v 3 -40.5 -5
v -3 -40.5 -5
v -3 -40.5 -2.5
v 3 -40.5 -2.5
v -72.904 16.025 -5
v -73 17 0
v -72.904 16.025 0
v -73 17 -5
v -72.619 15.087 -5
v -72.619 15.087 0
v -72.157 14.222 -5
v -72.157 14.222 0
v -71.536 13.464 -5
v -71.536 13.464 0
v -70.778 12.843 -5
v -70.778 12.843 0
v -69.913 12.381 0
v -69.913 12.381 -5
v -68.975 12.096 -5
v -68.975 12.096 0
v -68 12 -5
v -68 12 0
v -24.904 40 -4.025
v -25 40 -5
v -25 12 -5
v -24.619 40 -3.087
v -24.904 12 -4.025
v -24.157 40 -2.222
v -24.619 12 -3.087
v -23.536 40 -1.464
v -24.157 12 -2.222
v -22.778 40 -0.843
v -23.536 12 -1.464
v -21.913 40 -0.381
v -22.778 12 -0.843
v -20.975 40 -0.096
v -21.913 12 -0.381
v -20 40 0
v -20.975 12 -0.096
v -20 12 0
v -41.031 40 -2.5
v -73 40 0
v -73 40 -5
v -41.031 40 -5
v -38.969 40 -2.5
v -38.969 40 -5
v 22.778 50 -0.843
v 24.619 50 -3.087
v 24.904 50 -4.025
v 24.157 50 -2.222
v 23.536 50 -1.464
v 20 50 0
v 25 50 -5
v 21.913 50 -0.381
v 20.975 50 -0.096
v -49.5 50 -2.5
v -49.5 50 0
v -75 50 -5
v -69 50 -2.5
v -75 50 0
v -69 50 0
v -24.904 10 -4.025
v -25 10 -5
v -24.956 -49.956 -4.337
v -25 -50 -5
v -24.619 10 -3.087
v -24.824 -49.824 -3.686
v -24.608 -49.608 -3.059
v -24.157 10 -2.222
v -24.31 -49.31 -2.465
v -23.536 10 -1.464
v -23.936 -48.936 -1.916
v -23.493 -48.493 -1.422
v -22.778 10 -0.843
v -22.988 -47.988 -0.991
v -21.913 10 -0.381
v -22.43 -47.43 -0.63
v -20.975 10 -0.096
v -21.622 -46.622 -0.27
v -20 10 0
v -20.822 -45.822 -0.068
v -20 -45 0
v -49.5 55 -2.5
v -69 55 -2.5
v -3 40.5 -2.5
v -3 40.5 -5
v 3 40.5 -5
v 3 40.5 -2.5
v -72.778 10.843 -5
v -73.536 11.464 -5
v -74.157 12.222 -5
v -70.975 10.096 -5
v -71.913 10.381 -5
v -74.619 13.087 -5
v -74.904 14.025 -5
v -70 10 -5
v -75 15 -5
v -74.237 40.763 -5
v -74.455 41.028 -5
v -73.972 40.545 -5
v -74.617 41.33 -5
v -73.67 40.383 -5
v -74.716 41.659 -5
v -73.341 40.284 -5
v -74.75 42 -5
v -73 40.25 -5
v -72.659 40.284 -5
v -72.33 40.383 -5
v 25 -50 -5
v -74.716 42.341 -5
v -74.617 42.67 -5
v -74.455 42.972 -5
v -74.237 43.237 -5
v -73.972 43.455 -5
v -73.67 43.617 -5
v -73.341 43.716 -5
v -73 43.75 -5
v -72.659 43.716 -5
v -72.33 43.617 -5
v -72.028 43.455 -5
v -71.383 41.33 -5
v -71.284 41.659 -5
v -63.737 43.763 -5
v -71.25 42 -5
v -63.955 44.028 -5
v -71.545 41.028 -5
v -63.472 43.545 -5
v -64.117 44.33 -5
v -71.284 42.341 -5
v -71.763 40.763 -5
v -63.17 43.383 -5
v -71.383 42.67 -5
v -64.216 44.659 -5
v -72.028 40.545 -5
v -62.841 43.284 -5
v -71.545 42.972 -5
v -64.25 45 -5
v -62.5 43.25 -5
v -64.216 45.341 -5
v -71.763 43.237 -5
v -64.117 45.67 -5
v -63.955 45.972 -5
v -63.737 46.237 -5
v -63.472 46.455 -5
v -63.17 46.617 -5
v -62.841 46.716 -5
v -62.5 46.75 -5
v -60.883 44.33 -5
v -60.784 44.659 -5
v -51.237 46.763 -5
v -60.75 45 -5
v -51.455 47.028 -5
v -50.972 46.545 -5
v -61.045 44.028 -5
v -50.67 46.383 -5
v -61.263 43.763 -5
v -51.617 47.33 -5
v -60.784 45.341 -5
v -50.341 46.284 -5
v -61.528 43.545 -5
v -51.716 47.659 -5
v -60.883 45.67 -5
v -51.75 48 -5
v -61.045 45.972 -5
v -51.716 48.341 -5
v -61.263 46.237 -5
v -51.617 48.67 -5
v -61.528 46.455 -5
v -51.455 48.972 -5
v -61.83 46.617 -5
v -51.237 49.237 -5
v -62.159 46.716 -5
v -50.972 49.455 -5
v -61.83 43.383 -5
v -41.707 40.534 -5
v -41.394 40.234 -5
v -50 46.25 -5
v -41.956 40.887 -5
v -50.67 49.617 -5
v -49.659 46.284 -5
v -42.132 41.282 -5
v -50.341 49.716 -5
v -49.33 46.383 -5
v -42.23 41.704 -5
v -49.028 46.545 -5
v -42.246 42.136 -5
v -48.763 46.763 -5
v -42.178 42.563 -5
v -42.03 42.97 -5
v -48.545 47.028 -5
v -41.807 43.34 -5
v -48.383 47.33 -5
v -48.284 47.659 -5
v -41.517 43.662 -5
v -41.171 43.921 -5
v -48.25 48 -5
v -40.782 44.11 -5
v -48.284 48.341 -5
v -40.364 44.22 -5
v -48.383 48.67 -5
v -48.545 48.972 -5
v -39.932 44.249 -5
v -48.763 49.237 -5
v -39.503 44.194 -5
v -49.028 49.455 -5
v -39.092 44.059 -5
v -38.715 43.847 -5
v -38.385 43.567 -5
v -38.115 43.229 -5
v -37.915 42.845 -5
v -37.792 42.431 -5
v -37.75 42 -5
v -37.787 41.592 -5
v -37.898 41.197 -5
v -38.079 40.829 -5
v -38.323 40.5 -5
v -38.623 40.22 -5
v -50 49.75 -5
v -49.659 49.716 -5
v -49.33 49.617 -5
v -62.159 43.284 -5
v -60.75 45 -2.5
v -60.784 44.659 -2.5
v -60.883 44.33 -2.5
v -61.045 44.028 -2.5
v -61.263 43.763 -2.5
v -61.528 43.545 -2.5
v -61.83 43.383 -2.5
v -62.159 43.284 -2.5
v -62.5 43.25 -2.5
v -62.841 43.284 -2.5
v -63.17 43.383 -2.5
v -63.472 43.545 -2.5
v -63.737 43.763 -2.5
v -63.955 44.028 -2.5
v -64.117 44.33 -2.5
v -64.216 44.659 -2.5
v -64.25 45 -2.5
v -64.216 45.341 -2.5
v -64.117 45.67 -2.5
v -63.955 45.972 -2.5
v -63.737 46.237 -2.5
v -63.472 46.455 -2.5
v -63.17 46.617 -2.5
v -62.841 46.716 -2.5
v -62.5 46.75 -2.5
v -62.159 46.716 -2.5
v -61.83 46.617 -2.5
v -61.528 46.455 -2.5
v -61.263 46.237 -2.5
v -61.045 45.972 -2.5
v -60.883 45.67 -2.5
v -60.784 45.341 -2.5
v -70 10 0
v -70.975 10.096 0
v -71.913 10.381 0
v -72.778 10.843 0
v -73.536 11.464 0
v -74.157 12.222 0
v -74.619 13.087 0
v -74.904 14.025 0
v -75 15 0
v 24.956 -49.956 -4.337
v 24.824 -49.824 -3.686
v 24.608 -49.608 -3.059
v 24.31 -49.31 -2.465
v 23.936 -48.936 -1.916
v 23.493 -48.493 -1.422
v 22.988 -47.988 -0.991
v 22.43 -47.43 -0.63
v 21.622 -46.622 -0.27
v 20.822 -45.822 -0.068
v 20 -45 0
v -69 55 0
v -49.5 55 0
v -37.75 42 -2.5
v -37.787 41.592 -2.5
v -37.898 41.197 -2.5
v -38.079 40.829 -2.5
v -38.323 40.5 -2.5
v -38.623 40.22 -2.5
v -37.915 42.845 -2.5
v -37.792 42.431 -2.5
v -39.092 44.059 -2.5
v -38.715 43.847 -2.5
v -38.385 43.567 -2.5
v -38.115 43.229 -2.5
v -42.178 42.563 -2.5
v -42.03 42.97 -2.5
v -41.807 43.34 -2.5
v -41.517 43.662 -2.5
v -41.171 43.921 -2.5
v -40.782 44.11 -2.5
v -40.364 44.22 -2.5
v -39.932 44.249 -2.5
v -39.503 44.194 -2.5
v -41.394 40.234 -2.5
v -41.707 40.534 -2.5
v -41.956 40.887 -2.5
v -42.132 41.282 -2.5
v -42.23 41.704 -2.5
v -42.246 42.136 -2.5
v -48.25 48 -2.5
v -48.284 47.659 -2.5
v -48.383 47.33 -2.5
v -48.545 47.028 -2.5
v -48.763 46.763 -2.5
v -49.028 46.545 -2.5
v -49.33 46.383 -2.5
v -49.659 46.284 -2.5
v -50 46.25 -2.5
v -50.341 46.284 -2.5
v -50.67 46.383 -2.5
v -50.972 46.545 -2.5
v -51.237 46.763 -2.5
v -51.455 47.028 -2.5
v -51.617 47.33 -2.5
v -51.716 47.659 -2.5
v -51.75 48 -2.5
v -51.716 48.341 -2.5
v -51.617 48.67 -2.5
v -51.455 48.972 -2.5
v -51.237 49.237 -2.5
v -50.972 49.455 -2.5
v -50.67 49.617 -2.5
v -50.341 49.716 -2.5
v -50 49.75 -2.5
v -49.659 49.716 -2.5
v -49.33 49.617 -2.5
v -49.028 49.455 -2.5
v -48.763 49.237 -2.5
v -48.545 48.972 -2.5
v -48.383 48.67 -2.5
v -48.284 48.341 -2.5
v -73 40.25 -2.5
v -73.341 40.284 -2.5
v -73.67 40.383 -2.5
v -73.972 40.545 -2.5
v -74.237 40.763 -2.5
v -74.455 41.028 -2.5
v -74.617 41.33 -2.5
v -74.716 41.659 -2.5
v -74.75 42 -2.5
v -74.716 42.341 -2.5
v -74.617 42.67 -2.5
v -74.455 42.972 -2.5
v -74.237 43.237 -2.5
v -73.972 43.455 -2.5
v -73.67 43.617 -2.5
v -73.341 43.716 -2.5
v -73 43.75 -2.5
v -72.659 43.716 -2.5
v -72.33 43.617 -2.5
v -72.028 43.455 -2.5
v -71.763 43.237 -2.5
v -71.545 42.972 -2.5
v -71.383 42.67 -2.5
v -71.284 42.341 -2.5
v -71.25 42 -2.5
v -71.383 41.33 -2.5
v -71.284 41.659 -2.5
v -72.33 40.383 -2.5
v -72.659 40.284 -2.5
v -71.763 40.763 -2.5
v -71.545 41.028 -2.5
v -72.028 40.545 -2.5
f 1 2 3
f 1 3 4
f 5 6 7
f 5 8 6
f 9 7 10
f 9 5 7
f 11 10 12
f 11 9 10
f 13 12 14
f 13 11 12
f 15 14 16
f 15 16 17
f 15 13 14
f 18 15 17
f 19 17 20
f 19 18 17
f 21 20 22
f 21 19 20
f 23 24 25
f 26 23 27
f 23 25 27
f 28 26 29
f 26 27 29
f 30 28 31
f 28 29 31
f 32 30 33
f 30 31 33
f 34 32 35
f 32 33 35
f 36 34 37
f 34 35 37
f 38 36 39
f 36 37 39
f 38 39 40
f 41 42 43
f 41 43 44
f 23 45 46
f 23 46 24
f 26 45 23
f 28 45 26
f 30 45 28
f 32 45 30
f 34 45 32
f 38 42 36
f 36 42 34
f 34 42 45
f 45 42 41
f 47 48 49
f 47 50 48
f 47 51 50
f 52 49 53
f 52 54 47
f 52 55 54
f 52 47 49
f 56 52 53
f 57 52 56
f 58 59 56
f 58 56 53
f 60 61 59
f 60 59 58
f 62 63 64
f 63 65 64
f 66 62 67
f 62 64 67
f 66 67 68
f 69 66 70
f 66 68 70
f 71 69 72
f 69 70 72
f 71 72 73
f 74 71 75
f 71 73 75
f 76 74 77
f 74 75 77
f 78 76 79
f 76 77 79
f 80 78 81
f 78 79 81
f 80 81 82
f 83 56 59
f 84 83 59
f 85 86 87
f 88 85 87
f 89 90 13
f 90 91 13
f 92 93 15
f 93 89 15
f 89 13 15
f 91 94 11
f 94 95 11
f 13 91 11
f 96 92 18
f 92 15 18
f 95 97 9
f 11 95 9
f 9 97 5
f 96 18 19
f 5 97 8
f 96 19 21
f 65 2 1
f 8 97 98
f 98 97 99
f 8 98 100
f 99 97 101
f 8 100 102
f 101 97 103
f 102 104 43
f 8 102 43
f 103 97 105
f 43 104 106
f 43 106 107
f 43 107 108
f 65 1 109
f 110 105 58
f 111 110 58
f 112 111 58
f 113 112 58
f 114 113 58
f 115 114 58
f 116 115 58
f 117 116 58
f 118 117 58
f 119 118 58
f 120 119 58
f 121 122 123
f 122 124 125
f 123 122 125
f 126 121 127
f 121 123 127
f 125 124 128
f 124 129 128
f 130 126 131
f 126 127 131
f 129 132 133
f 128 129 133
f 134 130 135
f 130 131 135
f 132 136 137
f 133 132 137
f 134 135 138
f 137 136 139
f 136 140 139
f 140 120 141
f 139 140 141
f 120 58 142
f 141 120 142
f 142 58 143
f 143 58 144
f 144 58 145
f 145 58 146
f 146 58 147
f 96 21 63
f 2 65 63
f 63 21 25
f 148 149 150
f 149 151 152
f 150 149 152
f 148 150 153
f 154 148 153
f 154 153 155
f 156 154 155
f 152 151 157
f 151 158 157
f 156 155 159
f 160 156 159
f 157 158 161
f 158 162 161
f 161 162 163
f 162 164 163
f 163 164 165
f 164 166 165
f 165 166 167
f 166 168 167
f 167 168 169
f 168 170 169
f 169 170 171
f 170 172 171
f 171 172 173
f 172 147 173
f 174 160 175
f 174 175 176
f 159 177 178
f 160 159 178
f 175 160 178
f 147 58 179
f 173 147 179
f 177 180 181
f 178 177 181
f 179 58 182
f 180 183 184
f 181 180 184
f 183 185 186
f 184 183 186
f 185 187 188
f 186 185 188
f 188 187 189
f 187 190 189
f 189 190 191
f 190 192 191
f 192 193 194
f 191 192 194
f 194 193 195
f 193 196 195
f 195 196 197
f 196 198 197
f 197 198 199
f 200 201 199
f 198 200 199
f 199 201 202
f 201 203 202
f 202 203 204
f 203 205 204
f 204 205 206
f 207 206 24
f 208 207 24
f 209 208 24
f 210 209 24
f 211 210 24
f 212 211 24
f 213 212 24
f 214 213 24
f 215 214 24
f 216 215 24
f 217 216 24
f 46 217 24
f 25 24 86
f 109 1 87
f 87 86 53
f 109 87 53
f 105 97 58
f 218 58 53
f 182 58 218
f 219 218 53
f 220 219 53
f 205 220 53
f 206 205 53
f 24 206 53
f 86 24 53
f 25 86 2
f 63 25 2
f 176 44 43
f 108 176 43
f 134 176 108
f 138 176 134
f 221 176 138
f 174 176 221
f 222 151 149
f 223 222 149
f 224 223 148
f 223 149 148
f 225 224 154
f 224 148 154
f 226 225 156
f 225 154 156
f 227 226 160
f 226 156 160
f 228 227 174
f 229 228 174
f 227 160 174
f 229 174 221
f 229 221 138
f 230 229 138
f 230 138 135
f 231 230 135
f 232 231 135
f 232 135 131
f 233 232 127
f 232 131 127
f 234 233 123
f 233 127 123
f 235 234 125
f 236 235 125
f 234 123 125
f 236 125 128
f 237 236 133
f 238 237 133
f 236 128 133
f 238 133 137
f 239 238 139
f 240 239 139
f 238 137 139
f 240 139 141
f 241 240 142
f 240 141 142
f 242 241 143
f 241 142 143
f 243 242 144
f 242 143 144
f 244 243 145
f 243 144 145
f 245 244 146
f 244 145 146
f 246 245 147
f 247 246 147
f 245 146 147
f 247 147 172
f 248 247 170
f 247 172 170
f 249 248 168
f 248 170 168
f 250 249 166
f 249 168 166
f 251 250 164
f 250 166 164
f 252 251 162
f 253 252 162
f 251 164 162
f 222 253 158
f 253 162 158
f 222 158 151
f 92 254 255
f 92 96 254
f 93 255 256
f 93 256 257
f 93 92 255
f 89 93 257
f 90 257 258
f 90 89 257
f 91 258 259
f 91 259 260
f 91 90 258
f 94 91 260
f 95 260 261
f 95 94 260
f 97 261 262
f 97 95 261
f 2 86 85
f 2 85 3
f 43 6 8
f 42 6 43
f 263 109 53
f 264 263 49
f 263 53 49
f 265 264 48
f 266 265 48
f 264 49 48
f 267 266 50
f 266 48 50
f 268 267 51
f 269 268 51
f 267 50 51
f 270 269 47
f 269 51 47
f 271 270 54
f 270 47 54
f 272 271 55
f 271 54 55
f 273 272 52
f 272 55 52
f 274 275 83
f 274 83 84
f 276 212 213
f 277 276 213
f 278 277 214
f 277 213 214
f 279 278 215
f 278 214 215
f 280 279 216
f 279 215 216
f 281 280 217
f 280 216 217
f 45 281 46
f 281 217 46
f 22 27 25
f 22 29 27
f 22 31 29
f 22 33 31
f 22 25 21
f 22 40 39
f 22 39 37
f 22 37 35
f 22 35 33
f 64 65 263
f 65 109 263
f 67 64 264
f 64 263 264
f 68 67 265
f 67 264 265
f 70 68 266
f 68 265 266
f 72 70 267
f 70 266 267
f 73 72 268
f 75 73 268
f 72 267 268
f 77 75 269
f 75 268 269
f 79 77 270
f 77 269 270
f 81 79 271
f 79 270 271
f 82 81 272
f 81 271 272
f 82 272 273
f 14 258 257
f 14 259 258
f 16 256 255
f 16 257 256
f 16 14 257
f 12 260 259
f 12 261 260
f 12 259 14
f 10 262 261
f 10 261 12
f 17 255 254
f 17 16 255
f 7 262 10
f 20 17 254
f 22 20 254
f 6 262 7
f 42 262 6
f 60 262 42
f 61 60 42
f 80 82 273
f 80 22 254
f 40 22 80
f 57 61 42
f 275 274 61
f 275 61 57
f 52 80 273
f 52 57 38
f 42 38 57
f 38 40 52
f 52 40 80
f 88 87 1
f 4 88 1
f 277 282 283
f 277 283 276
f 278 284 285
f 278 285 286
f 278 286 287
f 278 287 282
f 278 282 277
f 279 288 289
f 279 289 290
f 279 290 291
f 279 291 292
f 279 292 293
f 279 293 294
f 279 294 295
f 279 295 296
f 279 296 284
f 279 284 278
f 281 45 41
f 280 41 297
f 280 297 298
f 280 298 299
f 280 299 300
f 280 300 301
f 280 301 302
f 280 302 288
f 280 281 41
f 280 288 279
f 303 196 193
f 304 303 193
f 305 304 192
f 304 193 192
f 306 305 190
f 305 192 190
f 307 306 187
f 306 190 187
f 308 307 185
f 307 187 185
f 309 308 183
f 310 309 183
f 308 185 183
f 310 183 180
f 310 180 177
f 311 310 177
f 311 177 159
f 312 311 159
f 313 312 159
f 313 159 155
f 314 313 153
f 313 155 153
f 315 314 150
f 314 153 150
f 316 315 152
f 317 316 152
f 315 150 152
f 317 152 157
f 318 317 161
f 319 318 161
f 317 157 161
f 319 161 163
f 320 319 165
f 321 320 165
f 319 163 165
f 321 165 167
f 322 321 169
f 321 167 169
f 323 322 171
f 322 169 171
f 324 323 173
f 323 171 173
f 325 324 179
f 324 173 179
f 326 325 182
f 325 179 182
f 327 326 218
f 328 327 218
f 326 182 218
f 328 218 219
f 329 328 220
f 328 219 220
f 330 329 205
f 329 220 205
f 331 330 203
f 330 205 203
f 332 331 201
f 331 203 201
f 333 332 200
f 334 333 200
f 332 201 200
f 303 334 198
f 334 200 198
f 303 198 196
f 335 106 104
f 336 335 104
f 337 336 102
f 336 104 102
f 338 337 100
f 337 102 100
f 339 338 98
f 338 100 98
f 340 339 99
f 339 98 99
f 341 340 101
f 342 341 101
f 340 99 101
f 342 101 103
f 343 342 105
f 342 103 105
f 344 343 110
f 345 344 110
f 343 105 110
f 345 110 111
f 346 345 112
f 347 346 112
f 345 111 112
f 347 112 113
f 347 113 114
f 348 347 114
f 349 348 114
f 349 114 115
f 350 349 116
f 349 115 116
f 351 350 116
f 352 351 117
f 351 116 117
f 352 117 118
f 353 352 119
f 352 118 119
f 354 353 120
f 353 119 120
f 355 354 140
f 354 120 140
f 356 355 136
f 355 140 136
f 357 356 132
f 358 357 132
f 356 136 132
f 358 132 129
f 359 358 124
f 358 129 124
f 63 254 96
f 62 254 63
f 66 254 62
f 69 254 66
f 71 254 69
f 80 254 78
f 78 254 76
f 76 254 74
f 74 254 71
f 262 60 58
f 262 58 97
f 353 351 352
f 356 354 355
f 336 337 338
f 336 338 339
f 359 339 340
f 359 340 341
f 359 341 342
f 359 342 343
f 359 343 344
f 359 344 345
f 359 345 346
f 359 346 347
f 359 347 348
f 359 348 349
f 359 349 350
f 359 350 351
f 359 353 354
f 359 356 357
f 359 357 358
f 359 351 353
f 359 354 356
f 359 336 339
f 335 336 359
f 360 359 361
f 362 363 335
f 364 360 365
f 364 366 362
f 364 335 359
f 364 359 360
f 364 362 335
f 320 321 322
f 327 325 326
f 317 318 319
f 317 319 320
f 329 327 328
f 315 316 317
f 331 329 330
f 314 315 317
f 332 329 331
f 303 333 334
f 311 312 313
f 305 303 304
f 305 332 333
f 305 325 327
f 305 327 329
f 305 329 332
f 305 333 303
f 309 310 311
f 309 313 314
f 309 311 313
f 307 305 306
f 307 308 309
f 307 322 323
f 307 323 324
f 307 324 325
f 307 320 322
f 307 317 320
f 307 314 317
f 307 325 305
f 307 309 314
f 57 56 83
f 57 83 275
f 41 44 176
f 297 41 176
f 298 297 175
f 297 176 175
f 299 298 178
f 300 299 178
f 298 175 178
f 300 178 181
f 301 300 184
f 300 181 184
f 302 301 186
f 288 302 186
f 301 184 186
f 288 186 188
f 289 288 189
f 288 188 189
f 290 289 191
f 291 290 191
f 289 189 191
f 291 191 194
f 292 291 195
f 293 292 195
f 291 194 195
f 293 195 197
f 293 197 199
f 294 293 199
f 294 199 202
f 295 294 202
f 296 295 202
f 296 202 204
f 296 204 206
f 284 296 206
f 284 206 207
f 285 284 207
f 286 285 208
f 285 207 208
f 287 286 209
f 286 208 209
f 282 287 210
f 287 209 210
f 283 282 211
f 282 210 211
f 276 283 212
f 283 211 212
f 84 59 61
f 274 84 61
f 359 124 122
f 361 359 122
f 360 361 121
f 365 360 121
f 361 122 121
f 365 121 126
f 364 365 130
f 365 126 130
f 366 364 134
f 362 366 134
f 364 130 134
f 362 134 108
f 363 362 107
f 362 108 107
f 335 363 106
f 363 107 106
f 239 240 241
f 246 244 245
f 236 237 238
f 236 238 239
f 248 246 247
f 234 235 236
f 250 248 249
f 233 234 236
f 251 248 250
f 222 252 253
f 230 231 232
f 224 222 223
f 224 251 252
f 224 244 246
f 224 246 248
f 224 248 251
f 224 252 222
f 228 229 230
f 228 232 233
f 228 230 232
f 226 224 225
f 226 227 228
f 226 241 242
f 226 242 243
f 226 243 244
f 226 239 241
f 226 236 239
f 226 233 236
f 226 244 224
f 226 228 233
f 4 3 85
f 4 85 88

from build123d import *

# Parameters (mm, degrees)
F0_W     = 48
F0_H     = 10
F1_DEPTH = 5
F2_R     = 4.99999
F3_R     = 5
F4_W     = 6
F4_H     = 81
F4_R     = 1.75
F5_DEPTH = 2.5
F6_W     = 19.5
F6_H     = 2.5
F7_DEPTH = 5


# Not quite as in the source:
# - a fillet or chamfer is up to 0.001 mm smaller than in the source, because OpenCascade refuses the exact size


with BuildPart() as f1:
    # F0 (on Top) → F1 (new body)
    with BuildSketch(Plane.XY):
        Polygon((-73, 40), (-73, 50), (-75, 50), (-75, 10), (-25, 10), (-25, 12), (-73, 12), align=None)
        Polygon((25, -50), (25, 50), (-25, 50), (-25, 40), (-25, 12), (-25, 10), (-25, -50), align=None)
        with Locations((-49, 45)):
            Rectangle(F0_W, F0_H)
    extrude(amount=-F1_DEPTH)

    # F2 (radius 5 in the source; OpenCascade refuses exactly that, so slightly less here)
    f2_edges = [f1.edges().sort_by_distance(p)[0] for p in [
        (-25, -20, 0),
        (0, -50, 0),
        (25, 0, 0),
        (-25, 26, 0),
    ]]
    fillet(f2_edges, radius=F2_R)

    # F3
    f3_edges = [f1.edges().sort_by_distance(p)[0] for p in [
        (-73, 12, -2.5),
        (-75, 10, -2.5),
    ]]
    fillet(f3_edges, radius=F3_R)

    # F4 (on face) → F5 (cut)
    with BuildSketch(Plane(origin=(0, 0, -5), x_dir=(1, 0, 0), z_dir=(0, 0, -1))):
        Rectangle(F4_W, F4_H)
        with BuildLine():
            ThreePointArc((-41.0307764064, -40), (-41.1711646096, -43.9211646096), (-37.75, -42))
            ThreePointArc((-37.75, -42), (-38.0788353904, -40.8288353904), (-38.9692235936, -40))
            Line((-38.9692235936, -40), (-41.0307764064, -40))
        make_face()
        with Locations((-50, -48)):
            Circle(F4_R)
        with Locations((-62.5, -45)):
            Circle(F4_R)
        with BuildLine():
            ThreePointArc((-71.25, -42), (-71.7625631329, -40.7625631329), (-73, -40.25))
            ThreePointArc((-73, -40.25), (-74.2374368671, -43.2374368671), (-71.25, -42))
        make_face()
    extrude(amount=-F5_DEPTH, mode=Mode.SUBTRACT)

    # F6 (on face) → F7 (join)
    with BuildSketch(Plane(origin=(0, 50, 0), x_dir=(-1, 0, 0), z_dir=(0, 1, 0))):
        with Locations((59.25, -1.25)):
            Rectangle(F6_W, F6_H)
    extrude(amount=F7_DEPTH)


solid = f1.part
